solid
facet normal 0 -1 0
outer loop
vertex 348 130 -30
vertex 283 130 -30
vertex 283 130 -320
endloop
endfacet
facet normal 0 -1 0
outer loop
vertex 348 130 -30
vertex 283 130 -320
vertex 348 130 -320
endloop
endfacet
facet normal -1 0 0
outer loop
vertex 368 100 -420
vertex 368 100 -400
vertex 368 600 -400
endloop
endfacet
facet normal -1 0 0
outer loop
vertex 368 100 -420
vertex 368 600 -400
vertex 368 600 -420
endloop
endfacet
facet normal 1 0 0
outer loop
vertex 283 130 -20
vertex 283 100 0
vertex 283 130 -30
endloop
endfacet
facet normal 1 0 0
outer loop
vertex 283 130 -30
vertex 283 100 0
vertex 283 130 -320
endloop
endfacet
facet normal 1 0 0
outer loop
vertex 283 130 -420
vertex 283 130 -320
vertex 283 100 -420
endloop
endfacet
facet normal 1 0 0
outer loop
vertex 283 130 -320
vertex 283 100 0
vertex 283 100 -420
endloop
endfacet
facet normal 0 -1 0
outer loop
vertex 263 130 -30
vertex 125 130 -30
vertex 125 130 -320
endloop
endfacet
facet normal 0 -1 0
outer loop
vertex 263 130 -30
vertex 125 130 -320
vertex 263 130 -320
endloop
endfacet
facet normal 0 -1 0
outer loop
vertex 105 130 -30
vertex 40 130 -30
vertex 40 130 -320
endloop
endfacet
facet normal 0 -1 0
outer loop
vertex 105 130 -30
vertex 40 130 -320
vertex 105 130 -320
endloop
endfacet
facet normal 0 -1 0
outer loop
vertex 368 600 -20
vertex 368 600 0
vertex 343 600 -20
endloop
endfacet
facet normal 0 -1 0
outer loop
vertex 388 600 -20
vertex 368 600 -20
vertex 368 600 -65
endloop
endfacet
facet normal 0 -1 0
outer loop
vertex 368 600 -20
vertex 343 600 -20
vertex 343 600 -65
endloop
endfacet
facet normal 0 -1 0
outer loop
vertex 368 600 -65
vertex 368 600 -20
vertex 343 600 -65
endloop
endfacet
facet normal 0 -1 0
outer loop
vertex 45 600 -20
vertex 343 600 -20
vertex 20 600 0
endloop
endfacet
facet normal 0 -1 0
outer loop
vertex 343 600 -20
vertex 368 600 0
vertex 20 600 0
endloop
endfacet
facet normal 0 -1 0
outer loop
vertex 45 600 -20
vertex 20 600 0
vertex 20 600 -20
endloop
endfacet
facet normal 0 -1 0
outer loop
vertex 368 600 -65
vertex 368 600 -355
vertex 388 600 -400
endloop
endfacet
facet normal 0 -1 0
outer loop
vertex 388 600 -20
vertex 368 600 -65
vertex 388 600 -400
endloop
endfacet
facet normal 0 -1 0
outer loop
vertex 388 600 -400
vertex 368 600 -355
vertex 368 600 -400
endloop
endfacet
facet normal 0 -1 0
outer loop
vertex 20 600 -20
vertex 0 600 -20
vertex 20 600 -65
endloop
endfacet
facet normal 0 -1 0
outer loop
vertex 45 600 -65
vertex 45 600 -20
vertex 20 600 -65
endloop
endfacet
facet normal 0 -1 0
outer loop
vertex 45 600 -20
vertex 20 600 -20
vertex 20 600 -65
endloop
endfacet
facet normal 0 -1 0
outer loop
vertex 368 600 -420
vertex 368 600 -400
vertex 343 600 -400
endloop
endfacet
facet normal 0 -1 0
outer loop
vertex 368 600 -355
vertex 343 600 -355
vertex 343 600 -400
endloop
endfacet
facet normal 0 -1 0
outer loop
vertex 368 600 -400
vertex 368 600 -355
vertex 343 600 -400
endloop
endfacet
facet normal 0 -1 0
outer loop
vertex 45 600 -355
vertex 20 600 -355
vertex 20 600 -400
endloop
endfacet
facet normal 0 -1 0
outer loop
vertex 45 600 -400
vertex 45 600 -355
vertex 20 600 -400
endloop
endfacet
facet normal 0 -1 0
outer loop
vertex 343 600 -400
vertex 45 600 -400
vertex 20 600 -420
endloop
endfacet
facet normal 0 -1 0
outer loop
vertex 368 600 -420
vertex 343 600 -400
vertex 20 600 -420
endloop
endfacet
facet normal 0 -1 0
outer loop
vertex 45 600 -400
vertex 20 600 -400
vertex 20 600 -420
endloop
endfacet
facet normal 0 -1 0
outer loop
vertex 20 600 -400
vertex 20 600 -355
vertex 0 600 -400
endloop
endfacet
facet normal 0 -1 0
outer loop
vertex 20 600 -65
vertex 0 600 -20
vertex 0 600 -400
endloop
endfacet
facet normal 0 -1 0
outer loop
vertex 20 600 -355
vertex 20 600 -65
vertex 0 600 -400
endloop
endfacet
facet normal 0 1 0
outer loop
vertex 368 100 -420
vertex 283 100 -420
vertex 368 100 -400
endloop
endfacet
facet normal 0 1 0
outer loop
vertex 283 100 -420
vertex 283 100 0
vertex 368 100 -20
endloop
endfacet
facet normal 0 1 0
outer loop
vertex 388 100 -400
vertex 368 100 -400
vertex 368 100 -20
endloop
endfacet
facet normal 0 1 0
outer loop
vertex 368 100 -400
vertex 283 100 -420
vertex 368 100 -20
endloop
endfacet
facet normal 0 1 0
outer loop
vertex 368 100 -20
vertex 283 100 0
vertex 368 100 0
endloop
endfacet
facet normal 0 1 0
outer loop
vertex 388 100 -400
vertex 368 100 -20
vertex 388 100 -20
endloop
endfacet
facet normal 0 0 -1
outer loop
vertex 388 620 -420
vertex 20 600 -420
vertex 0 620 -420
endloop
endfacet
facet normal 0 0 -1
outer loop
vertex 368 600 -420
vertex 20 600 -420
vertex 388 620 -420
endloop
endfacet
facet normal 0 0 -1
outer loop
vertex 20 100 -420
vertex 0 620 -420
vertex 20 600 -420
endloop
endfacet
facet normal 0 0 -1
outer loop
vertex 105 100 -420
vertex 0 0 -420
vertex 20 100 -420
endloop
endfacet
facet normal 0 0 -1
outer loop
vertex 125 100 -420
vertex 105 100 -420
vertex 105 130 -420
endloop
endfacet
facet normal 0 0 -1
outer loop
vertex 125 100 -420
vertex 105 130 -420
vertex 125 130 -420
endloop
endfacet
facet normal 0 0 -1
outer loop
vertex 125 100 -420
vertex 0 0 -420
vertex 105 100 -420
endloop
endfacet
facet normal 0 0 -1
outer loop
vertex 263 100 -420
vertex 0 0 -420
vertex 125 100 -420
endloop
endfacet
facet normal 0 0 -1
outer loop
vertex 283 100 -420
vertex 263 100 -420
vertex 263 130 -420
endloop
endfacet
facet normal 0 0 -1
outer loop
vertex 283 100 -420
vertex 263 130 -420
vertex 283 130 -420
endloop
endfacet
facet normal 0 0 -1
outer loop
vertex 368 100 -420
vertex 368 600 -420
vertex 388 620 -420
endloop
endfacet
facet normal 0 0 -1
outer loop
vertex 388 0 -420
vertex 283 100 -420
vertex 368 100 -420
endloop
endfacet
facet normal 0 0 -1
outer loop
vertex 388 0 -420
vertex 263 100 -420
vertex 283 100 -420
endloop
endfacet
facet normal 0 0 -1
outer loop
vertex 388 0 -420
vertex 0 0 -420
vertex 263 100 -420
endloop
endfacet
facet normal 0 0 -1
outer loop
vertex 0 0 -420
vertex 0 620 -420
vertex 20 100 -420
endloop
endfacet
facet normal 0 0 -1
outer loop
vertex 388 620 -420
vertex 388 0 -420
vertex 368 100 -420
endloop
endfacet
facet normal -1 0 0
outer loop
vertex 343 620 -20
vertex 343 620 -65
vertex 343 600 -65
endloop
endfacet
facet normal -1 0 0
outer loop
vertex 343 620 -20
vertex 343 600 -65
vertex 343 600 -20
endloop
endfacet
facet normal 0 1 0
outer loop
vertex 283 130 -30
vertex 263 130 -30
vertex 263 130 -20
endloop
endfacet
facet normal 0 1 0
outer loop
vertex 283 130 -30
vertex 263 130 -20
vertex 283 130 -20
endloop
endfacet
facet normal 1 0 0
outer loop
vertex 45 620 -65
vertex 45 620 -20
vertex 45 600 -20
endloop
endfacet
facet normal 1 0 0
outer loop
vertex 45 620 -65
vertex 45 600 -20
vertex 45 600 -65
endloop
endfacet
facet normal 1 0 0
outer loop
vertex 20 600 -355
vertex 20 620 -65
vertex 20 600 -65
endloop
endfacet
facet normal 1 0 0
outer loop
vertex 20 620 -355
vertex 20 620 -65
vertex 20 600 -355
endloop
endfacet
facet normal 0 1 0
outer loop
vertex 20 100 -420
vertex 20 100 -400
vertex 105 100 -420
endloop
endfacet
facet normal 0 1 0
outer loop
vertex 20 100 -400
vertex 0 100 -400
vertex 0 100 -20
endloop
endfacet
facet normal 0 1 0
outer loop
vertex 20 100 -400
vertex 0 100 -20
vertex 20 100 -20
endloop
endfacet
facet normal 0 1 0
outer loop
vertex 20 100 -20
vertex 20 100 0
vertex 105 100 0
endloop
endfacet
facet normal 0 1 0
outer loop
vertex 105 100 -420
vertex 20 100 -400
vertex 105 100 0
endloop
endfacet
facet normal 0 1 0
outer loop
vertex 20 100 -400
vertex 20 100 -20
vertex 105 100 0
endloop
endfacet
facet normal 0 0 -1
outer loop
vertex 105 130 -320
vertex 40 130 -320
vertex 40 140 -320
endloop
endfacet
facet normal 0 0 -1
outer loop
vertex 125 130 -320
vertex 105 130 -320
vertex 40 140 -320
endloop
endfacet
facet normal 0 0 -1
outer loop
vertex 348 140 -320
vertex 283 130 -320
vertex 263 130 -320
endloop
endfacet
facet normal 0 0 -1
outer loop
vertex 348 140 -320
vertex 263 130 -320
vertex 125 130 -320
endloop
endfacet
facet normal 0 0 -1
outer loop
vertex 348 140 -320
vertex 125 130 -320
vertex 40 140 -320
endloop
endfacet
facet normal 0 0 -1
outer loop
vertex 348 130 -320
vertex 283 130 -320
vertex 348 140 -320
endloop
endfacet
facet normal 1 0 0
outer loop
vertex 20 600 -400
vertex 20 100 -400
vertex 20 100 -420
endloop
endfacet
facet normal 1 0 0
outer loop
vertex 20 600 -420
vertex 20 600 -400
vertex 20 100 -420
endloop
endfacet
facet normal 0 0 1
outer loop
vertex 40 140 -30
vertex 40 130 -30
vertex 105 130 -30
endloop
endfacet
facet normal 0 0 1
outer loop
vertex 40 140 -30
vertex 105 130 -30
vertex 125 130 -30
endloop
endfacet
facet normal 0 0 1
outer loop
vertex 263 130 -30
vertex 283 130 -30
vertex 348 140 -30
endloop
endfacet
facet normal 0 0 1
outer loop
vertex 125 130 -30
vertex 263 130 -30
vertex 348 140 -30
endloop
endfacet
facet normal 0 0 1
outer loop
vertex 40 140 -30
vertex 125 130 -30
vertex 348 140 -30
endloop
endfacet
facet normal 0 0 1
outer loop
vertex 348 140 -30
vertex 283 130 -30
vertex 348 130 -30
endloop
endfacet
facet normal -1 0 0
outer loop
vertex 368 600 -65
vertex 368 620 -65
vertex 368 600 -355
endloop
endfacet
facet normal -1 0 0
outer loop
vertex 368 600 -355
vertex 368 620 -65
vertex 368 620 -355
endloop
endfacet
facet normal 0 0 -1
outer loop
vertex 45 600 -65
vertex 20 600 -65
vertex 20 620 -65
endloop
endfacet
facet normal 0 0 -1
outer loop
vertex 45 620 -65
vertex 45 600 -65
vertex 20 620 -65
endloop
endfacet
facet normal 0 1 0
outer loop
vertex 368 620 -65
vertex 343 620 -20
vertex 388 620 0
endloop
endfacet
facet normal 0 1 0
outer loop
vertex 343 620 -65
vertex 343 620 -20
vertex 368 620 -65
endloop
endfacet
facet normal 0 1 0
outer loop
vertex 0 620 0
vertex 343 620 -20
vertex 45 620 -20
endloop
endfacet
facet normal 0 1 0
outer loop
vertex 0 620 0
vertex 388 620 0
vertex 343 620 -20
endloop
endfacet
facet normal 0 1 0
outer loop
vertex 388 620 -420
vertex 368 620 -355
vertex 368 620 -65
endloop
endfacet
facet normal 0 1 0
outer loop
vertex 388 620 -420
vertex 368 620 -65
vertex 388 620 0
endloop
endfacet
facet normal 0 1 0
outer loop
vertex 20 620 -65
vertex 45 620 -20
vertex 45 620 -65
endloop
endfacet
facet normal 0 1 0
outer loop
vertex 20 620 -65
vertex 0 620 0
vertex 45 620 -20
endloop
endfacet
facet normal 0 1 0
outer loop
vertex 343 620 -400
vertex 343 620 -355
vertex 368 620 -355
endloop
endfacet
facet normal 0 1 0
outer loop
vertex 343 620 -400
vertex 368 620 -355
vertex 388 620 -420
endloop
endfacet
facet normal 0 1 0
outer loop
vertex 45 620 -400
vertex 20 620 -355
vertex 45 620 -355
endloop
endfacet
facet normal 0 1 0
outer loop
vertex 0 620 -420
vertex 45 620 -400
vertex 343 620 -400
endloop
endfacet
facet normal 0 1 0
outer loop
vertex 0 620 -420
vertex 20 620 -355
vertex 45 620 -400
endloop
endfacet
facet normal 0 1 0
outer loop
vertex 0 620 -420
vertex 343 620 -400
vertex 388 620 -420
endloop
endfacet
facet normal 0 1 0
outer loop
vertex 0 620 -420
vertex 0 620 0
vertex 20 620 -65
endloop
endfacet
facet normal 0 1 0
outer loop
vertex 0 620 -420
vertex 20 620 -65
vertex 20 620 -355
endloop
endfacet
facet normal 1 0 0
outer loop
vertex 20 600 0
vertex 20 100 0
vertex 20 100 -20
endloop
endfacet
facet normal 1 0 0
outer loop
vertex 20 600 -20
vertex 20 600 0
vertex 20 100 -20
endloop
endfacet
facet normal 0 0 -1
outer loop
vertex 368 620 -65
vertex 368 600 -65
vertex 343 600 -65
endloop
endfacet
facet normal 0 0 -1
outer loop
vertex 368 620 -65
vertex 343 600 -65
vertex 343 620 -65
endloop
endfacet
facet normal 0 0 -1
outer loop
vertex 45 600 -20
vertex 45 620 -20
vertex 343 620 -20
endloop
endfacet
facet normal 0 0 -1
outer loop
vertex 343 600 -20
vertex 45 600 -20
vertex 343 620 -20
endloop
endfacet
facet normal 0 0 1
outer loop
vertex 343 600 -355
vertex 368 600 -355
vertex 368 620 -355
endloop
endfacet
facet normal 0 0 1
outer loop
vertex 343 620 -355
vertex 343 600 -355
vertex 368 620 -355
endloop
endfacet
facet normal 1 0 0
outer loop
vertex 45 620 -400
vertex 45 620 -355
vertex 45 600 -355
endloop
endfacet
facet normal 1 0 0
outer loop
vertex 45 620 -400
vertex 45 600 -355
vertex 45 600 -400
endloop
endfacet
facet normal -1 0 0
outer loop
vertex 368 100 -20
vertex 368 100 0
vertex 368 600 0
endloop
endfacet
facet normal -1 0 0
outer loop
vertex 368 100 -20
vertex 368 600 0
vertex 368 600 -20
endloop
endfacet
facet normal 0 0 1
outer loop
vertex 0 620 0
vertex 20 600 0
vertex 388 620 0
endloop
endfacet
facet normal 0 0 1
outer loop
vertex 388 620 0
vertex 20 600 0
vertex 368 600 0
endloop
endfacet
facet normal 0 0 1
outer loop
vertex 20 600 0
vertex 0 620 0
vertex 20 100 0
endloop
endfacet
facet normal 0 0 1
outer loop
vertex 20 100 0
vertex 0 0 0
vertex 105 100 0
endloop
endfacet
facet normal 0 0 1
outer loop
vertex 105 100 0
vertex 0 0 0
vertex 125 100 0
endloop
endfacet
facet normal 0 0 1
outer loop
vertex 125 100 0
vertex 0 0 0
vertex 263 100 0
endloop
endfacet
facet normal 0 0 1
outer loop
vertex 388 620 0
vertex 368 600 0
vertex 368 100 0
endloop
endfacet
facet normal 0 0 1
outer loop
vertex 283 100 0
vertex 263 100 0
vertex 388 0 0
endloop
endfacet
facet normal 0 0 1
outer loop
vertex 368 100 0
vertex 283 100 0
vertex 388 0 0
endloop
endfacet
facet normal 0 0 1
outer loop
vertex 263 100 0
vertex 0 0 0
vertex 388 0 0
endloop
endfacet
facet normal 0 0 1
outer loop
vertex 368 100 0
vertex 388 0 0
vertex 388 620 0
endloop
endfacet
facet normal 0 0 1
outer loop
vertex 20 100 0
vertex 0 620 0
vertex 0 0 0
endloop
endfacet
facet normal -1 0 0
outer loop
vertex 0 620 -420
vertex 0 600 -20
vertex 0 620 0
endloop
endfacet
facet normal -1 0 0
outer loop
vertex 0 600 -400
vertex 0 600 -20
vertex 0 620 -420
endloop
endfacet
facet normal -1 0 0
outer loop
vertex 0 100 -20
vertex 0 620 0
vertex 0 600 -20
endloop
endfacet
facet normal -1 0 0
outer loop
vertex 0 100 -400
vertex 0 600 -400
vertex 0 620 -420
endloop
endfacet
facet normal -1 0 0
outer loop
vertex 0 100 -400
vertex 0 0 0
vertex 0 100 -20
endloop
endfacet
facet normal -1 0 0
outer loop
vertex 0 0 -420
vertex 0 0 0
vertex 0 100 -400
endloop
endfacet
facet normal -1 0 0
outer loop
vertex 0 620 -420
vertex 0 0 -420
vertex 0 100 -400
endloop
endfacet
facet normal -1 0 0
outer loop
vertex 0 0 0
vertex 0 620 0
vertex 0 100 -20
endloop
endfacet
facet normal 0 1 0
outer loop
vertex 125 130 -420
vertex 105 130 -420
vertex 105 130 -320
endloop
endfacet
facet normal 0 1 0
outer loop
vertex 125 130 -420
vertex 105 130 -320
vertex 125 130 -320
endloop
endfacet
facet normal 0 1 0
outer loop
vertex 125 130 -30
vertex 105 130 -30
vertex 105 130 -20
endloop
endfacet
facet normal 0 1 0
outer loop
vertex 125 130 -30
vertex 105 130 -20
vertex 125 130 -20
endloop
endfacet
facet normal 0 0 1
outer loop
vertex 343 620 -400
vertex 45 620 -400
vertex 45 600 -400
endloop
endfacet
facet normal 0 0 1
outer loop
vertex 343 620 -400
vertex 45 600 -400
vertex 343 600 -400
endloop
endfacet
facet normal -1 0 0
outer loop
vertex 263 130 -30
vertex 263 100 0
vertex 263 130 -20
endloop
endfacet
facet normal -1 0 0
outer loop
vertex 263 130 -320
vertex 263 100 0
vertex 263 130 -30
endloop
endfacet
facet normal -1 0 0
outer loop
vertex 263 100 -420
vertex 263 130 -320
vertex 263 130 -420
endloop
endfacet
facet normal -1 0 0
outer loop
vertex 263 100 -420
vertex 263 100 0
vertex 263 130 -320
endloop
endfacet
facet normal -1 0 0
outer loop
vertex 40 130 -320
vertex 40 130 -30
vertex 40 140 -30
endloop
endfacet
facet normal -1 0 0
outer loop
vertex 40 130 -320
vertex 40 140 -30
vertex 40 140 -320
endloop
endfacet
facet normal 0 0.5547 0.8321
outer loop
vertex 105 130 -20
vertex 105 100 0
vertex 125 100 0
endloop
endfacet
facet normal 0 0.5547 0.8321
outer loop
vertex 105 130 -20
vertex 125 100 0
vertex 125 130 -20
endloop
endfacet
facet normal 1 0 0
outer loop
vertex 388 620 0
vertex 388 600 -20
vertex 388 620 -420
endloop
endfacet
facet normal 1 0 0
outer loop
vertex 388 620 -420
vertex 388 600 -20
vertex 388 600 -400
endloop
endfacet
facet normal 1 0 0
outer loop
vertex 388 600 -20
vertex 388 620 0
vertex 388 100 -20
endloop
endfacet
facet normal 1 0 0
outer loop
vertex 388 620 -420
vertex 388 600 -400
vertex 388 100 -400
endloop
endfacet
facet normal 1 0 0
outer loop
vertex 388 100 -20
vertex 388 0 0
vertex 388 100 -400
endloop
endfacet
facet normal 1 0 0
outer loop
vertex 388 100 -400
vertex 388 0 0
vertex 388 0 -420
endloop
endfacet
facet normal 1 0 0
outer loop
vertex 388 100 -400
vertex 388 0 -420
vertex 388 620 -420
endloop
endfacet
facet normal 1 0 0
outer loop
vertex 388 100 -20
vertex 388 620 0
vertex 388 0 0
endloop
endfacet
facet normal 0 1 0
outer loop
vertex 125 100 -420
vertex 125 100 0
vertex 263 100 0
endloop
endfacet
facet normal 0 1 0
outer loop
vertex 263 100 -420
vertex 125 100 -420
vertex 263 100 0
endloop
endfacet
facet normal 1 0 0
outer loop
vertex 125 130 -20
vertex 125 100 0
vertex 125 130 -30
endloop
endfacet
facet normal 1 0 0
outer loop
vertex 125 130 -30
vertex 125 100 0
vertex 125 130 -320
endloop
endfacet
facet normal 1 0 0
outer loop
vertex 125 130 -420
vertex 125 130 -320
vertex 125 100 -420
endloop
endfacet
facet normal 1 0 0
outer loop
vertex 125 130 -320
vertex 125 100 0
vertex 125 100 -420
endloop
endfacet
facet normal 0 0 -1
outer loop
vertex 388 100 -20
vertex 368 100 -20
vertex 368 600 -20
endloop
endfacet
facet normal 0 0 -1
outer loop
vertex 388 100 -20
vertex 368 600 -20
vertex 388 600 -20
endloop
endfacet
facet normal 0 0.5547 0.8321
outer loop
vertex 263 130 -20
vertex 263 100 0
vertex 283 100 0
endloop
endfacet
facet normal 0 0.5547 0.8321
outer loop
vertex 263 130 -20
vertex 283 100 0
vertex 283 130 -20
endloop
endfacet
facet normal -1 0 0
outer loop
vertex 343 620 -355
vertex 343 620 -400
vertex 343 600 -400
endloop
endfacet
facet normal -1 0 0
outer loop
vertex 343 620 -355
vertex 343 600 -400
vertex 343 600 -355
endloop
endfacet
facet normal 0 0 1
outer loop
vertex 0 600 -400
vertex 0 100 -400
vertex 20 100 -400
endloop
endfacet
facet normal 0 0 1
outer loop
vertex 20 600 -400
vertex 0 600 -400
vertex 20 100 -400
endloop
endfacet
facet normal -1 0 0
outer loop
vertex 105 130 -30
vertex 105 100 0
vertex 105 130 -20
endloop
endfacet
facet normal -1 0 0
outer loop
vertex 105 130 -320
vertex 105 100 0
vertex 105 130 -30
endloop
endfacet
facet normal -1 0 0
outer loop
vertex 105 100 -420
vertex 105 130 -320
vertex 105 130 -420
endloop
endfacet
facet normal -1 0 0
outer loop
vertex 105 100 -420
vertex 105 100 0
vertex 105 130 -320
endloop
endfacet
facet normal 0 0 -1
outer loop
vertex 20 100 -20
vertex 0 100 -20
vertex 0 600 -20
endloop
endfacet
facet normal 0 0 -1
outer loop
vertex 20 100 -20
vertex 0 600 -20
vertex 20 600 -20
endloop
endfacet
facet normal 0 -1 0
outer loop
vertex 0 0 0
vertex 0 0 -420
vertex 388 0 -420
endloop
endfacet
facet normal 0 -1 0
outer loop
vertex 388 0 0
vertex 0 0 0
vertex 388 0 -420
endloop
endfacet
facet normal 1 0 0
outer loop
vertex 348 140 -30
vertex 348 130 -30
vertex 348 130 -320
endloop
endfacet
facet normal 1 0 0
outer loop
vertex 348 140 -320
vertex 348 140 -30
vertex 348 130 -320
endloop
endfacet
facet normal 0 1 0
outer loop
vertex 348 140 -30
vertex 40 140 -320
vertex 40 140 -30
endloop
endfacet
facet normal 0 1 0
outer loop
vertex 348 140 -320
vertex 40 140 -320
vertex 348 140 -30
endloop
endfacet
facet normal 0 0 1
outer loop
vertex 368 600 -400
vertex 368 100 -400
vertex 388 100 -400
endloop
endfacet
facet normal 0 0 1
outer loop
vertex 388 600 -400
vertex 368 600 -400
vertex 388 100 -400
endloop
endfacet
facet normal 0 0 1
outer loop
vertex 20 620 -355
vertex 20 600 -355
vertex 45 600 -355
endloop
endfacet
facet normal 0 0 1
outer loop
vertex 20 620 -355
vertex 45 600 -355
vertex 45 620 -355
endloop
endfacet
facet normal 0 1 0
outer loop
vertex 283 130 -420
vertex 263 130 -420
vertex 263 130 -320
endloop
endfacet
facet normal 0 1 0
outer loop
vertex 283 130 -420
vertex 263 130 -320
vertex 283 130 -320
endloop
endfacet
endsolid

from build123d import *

# Parameters (mm, degrees)
SKETCH_1_W          = 388
SKETCH_1_H          = 100
EXTRUDE_1_DEPTH     = 420
SKETCH_2_W          = 20
SKETCH_2_H          = 420
EXTRUDE_2_DEPTH     = 30
SKETCH_3_W          = 20
SKETCH_3_H          = 20
EXTRUDE_3_DEPTH     = 500
SKETCH_4_W          = 388
SKETCH_4_H          = 420
EXTRUDE_4_DEPTH     = 20
SKETCH_6_W          = 308
SKETCH_6_H          = 290
EXTRUDE_6_DEPTH     = 10
CUT_EXTRUDE_1_REACH = 802.555
CUT_EXTRUDE_2_REACH = 845.412
SKETCH_8_W          = 348
SKETCH_8_H          = 380
SKETCH_9_W          = 45
SKETCH_9_H          = 20
EXTRUDE_7_DEPTH     = 25
SKETCH_10_W         = 45
SKETCH_10_H         = 20
EXTRUDE_8_DEPTH     = 25


with BuildPart() as part:
    # 草图1 → 凸台-拉伸1 (new body)
    with BuildSketch(Plane.XY):
        with Locations((194, 50)):
            Rectangle(SKETCH_1_W, SKETCH_1_H)
    extrude(amount=-EXTRUDE_1_DEPTH)

    # 草图2 → 凸台-拉伸2 (add)
    with BuildSketch(Plane(origin=(0, 100, 0), x_dir=(1, 0, 0), z_dir=(0, 1, 0))):
        with Locations((115, 210)):
            Rectangle(SKETCH_2_W, SKETCH_2_H)
        with Locations((273, 210)):
            Rectangle(SKETCH_2_W, SKETCH_2_H)
    extrude(amount=EXTRUDE_2_DEPTH)

    # 草图3 → 凸台-拉伸3 (add)
    with BuildSketch(Plane(origin=(0, 100, 0), x_dir=(1, 0, 0), z_dir=(0, 1, 0))):
        with Locations((10, 10)):
            Rectangle(SKETCH_3_W, SKETCH_3_H)
        with Locations((10, 410)):
            Rectangle(SKETCH_3_W, SKETCH_3_H)
        with Locations((378, 10)):
            Rectangle(SKETCH_3_W, SKETCH_3_H)
        with Locations((378, 410)):
            Rectangle(SKETCH_3_W, SKETCH_3_H)
    extrude(amount=EXTRUDE_3_DEPTH)

    # 草图4 → 凸台-拉伸4 (add)
    with BuildSketch(Plane(origin=(0, 600, 0), x_dir=(1, 0, 0), z_dir=(0, 1, 0))):
        with Locations((194, 210)):
            Rectangle(SKETCH_4_W, SKETCH_4_H)
    extrude(amount=EXTRUDE_4_DEPTH)

    # 草图6 → 凸台-拉伸6 (add)
    with BuildSketch(Plane(origin=(0, 130, 0), x_dir=(1, 0, 0), z_dir=(0, 1, 0))):
        with Locations((194, 175)):
            Rectangle(SKETCH_6_W, SKETCH_6_H)
    extrude(amount=EXTRUDE_6_DEPTH)

    # 切除-拉伸1: up to this face of the body (flat: up to its plane)
    cut_extrude_1_end = Plane(part.part.faces().sort_by_distance((283, 115, -210))[0])
    # 草图7 → 切除-拉伸1 (cut, up to the picked face)
    with BuildSketch(Plane.ZY.offset(-105), mode=Mode.PRIVATE) as cut_extrude_1_sk1:
        Polygon((0, 100), (-20, 130), (0, 130), align=None)
    cut_extrude_1_tool1 = split(extrude(cut_extrude_1_sk1.sketch, amount=-CUT_EXTRUDE_1_REACH, mode=Mode.PRIVATE), bisect_by=cut_extrude_1_end, keep=Keep.BOTH, mode=Mode.PRIVATE)
    add(cut_extrude_1_tool1.solids().sort_by(Axis((105, 120, -6.666667), (1, 0, 0)))[0], mode=Mode.SUBTRACT)

    # 草图8 → 切除-拉伸2 (cut, up to next)
    with BuildSketch(Plane(origin=(0, 620, 0), x_dir=(1, 0, 0), z_dir=(0, 1, 0)), mode=Mode.PRIVATE) as cut_extrude_2_sk1:
        with Locations((194, 210)):
            Rectangle(SKETCH_8_W, SKETCH_8_H)
    cut_extrude_2_tool1 = extrude(cut_extrude_2_sk1.sketch, amount=-CUT_EXTRUDE_2_REACH, mode=Mode.PRIVATE) & part.part
    add(cut_extrude_2_tool1.solids().sort_by_distance((194, 620, -210))[0], mode=Mode.SUBTRACT)

    # 草图9 → 凸台-拉伸7 (add)
    with BuildSketch(Plane.ZY.offset(-368)):
        with Locations((-42.5, 610)):
            Rectangle(SKETCH_9_W, SKETCH_9_H)
        with Locations((-377.5, 610)):
            Rectangle(SKETCH_9_W, SKETCH_9_H)
    extrude(amount=EXTRUDE_7_DEPTH)

    # 草图10 → 凸台-拉伸8 (add)
    with BuildSketch(Plane(origin=(20, 0, 0), x_dir=(0, 0, -1), z_dir=(1, 0, 0))):
        with Locations((377.5, 610)):
            Rectangle(SKETCH_10_W, SKETCH_10_H)
        with Locations((42.5, 610)):
            Rectangle(SKETCH_10_W, SKETCH_10_H)
    extrude(amount=EXTRUDE_8_DEPTH)


solid = part.part
